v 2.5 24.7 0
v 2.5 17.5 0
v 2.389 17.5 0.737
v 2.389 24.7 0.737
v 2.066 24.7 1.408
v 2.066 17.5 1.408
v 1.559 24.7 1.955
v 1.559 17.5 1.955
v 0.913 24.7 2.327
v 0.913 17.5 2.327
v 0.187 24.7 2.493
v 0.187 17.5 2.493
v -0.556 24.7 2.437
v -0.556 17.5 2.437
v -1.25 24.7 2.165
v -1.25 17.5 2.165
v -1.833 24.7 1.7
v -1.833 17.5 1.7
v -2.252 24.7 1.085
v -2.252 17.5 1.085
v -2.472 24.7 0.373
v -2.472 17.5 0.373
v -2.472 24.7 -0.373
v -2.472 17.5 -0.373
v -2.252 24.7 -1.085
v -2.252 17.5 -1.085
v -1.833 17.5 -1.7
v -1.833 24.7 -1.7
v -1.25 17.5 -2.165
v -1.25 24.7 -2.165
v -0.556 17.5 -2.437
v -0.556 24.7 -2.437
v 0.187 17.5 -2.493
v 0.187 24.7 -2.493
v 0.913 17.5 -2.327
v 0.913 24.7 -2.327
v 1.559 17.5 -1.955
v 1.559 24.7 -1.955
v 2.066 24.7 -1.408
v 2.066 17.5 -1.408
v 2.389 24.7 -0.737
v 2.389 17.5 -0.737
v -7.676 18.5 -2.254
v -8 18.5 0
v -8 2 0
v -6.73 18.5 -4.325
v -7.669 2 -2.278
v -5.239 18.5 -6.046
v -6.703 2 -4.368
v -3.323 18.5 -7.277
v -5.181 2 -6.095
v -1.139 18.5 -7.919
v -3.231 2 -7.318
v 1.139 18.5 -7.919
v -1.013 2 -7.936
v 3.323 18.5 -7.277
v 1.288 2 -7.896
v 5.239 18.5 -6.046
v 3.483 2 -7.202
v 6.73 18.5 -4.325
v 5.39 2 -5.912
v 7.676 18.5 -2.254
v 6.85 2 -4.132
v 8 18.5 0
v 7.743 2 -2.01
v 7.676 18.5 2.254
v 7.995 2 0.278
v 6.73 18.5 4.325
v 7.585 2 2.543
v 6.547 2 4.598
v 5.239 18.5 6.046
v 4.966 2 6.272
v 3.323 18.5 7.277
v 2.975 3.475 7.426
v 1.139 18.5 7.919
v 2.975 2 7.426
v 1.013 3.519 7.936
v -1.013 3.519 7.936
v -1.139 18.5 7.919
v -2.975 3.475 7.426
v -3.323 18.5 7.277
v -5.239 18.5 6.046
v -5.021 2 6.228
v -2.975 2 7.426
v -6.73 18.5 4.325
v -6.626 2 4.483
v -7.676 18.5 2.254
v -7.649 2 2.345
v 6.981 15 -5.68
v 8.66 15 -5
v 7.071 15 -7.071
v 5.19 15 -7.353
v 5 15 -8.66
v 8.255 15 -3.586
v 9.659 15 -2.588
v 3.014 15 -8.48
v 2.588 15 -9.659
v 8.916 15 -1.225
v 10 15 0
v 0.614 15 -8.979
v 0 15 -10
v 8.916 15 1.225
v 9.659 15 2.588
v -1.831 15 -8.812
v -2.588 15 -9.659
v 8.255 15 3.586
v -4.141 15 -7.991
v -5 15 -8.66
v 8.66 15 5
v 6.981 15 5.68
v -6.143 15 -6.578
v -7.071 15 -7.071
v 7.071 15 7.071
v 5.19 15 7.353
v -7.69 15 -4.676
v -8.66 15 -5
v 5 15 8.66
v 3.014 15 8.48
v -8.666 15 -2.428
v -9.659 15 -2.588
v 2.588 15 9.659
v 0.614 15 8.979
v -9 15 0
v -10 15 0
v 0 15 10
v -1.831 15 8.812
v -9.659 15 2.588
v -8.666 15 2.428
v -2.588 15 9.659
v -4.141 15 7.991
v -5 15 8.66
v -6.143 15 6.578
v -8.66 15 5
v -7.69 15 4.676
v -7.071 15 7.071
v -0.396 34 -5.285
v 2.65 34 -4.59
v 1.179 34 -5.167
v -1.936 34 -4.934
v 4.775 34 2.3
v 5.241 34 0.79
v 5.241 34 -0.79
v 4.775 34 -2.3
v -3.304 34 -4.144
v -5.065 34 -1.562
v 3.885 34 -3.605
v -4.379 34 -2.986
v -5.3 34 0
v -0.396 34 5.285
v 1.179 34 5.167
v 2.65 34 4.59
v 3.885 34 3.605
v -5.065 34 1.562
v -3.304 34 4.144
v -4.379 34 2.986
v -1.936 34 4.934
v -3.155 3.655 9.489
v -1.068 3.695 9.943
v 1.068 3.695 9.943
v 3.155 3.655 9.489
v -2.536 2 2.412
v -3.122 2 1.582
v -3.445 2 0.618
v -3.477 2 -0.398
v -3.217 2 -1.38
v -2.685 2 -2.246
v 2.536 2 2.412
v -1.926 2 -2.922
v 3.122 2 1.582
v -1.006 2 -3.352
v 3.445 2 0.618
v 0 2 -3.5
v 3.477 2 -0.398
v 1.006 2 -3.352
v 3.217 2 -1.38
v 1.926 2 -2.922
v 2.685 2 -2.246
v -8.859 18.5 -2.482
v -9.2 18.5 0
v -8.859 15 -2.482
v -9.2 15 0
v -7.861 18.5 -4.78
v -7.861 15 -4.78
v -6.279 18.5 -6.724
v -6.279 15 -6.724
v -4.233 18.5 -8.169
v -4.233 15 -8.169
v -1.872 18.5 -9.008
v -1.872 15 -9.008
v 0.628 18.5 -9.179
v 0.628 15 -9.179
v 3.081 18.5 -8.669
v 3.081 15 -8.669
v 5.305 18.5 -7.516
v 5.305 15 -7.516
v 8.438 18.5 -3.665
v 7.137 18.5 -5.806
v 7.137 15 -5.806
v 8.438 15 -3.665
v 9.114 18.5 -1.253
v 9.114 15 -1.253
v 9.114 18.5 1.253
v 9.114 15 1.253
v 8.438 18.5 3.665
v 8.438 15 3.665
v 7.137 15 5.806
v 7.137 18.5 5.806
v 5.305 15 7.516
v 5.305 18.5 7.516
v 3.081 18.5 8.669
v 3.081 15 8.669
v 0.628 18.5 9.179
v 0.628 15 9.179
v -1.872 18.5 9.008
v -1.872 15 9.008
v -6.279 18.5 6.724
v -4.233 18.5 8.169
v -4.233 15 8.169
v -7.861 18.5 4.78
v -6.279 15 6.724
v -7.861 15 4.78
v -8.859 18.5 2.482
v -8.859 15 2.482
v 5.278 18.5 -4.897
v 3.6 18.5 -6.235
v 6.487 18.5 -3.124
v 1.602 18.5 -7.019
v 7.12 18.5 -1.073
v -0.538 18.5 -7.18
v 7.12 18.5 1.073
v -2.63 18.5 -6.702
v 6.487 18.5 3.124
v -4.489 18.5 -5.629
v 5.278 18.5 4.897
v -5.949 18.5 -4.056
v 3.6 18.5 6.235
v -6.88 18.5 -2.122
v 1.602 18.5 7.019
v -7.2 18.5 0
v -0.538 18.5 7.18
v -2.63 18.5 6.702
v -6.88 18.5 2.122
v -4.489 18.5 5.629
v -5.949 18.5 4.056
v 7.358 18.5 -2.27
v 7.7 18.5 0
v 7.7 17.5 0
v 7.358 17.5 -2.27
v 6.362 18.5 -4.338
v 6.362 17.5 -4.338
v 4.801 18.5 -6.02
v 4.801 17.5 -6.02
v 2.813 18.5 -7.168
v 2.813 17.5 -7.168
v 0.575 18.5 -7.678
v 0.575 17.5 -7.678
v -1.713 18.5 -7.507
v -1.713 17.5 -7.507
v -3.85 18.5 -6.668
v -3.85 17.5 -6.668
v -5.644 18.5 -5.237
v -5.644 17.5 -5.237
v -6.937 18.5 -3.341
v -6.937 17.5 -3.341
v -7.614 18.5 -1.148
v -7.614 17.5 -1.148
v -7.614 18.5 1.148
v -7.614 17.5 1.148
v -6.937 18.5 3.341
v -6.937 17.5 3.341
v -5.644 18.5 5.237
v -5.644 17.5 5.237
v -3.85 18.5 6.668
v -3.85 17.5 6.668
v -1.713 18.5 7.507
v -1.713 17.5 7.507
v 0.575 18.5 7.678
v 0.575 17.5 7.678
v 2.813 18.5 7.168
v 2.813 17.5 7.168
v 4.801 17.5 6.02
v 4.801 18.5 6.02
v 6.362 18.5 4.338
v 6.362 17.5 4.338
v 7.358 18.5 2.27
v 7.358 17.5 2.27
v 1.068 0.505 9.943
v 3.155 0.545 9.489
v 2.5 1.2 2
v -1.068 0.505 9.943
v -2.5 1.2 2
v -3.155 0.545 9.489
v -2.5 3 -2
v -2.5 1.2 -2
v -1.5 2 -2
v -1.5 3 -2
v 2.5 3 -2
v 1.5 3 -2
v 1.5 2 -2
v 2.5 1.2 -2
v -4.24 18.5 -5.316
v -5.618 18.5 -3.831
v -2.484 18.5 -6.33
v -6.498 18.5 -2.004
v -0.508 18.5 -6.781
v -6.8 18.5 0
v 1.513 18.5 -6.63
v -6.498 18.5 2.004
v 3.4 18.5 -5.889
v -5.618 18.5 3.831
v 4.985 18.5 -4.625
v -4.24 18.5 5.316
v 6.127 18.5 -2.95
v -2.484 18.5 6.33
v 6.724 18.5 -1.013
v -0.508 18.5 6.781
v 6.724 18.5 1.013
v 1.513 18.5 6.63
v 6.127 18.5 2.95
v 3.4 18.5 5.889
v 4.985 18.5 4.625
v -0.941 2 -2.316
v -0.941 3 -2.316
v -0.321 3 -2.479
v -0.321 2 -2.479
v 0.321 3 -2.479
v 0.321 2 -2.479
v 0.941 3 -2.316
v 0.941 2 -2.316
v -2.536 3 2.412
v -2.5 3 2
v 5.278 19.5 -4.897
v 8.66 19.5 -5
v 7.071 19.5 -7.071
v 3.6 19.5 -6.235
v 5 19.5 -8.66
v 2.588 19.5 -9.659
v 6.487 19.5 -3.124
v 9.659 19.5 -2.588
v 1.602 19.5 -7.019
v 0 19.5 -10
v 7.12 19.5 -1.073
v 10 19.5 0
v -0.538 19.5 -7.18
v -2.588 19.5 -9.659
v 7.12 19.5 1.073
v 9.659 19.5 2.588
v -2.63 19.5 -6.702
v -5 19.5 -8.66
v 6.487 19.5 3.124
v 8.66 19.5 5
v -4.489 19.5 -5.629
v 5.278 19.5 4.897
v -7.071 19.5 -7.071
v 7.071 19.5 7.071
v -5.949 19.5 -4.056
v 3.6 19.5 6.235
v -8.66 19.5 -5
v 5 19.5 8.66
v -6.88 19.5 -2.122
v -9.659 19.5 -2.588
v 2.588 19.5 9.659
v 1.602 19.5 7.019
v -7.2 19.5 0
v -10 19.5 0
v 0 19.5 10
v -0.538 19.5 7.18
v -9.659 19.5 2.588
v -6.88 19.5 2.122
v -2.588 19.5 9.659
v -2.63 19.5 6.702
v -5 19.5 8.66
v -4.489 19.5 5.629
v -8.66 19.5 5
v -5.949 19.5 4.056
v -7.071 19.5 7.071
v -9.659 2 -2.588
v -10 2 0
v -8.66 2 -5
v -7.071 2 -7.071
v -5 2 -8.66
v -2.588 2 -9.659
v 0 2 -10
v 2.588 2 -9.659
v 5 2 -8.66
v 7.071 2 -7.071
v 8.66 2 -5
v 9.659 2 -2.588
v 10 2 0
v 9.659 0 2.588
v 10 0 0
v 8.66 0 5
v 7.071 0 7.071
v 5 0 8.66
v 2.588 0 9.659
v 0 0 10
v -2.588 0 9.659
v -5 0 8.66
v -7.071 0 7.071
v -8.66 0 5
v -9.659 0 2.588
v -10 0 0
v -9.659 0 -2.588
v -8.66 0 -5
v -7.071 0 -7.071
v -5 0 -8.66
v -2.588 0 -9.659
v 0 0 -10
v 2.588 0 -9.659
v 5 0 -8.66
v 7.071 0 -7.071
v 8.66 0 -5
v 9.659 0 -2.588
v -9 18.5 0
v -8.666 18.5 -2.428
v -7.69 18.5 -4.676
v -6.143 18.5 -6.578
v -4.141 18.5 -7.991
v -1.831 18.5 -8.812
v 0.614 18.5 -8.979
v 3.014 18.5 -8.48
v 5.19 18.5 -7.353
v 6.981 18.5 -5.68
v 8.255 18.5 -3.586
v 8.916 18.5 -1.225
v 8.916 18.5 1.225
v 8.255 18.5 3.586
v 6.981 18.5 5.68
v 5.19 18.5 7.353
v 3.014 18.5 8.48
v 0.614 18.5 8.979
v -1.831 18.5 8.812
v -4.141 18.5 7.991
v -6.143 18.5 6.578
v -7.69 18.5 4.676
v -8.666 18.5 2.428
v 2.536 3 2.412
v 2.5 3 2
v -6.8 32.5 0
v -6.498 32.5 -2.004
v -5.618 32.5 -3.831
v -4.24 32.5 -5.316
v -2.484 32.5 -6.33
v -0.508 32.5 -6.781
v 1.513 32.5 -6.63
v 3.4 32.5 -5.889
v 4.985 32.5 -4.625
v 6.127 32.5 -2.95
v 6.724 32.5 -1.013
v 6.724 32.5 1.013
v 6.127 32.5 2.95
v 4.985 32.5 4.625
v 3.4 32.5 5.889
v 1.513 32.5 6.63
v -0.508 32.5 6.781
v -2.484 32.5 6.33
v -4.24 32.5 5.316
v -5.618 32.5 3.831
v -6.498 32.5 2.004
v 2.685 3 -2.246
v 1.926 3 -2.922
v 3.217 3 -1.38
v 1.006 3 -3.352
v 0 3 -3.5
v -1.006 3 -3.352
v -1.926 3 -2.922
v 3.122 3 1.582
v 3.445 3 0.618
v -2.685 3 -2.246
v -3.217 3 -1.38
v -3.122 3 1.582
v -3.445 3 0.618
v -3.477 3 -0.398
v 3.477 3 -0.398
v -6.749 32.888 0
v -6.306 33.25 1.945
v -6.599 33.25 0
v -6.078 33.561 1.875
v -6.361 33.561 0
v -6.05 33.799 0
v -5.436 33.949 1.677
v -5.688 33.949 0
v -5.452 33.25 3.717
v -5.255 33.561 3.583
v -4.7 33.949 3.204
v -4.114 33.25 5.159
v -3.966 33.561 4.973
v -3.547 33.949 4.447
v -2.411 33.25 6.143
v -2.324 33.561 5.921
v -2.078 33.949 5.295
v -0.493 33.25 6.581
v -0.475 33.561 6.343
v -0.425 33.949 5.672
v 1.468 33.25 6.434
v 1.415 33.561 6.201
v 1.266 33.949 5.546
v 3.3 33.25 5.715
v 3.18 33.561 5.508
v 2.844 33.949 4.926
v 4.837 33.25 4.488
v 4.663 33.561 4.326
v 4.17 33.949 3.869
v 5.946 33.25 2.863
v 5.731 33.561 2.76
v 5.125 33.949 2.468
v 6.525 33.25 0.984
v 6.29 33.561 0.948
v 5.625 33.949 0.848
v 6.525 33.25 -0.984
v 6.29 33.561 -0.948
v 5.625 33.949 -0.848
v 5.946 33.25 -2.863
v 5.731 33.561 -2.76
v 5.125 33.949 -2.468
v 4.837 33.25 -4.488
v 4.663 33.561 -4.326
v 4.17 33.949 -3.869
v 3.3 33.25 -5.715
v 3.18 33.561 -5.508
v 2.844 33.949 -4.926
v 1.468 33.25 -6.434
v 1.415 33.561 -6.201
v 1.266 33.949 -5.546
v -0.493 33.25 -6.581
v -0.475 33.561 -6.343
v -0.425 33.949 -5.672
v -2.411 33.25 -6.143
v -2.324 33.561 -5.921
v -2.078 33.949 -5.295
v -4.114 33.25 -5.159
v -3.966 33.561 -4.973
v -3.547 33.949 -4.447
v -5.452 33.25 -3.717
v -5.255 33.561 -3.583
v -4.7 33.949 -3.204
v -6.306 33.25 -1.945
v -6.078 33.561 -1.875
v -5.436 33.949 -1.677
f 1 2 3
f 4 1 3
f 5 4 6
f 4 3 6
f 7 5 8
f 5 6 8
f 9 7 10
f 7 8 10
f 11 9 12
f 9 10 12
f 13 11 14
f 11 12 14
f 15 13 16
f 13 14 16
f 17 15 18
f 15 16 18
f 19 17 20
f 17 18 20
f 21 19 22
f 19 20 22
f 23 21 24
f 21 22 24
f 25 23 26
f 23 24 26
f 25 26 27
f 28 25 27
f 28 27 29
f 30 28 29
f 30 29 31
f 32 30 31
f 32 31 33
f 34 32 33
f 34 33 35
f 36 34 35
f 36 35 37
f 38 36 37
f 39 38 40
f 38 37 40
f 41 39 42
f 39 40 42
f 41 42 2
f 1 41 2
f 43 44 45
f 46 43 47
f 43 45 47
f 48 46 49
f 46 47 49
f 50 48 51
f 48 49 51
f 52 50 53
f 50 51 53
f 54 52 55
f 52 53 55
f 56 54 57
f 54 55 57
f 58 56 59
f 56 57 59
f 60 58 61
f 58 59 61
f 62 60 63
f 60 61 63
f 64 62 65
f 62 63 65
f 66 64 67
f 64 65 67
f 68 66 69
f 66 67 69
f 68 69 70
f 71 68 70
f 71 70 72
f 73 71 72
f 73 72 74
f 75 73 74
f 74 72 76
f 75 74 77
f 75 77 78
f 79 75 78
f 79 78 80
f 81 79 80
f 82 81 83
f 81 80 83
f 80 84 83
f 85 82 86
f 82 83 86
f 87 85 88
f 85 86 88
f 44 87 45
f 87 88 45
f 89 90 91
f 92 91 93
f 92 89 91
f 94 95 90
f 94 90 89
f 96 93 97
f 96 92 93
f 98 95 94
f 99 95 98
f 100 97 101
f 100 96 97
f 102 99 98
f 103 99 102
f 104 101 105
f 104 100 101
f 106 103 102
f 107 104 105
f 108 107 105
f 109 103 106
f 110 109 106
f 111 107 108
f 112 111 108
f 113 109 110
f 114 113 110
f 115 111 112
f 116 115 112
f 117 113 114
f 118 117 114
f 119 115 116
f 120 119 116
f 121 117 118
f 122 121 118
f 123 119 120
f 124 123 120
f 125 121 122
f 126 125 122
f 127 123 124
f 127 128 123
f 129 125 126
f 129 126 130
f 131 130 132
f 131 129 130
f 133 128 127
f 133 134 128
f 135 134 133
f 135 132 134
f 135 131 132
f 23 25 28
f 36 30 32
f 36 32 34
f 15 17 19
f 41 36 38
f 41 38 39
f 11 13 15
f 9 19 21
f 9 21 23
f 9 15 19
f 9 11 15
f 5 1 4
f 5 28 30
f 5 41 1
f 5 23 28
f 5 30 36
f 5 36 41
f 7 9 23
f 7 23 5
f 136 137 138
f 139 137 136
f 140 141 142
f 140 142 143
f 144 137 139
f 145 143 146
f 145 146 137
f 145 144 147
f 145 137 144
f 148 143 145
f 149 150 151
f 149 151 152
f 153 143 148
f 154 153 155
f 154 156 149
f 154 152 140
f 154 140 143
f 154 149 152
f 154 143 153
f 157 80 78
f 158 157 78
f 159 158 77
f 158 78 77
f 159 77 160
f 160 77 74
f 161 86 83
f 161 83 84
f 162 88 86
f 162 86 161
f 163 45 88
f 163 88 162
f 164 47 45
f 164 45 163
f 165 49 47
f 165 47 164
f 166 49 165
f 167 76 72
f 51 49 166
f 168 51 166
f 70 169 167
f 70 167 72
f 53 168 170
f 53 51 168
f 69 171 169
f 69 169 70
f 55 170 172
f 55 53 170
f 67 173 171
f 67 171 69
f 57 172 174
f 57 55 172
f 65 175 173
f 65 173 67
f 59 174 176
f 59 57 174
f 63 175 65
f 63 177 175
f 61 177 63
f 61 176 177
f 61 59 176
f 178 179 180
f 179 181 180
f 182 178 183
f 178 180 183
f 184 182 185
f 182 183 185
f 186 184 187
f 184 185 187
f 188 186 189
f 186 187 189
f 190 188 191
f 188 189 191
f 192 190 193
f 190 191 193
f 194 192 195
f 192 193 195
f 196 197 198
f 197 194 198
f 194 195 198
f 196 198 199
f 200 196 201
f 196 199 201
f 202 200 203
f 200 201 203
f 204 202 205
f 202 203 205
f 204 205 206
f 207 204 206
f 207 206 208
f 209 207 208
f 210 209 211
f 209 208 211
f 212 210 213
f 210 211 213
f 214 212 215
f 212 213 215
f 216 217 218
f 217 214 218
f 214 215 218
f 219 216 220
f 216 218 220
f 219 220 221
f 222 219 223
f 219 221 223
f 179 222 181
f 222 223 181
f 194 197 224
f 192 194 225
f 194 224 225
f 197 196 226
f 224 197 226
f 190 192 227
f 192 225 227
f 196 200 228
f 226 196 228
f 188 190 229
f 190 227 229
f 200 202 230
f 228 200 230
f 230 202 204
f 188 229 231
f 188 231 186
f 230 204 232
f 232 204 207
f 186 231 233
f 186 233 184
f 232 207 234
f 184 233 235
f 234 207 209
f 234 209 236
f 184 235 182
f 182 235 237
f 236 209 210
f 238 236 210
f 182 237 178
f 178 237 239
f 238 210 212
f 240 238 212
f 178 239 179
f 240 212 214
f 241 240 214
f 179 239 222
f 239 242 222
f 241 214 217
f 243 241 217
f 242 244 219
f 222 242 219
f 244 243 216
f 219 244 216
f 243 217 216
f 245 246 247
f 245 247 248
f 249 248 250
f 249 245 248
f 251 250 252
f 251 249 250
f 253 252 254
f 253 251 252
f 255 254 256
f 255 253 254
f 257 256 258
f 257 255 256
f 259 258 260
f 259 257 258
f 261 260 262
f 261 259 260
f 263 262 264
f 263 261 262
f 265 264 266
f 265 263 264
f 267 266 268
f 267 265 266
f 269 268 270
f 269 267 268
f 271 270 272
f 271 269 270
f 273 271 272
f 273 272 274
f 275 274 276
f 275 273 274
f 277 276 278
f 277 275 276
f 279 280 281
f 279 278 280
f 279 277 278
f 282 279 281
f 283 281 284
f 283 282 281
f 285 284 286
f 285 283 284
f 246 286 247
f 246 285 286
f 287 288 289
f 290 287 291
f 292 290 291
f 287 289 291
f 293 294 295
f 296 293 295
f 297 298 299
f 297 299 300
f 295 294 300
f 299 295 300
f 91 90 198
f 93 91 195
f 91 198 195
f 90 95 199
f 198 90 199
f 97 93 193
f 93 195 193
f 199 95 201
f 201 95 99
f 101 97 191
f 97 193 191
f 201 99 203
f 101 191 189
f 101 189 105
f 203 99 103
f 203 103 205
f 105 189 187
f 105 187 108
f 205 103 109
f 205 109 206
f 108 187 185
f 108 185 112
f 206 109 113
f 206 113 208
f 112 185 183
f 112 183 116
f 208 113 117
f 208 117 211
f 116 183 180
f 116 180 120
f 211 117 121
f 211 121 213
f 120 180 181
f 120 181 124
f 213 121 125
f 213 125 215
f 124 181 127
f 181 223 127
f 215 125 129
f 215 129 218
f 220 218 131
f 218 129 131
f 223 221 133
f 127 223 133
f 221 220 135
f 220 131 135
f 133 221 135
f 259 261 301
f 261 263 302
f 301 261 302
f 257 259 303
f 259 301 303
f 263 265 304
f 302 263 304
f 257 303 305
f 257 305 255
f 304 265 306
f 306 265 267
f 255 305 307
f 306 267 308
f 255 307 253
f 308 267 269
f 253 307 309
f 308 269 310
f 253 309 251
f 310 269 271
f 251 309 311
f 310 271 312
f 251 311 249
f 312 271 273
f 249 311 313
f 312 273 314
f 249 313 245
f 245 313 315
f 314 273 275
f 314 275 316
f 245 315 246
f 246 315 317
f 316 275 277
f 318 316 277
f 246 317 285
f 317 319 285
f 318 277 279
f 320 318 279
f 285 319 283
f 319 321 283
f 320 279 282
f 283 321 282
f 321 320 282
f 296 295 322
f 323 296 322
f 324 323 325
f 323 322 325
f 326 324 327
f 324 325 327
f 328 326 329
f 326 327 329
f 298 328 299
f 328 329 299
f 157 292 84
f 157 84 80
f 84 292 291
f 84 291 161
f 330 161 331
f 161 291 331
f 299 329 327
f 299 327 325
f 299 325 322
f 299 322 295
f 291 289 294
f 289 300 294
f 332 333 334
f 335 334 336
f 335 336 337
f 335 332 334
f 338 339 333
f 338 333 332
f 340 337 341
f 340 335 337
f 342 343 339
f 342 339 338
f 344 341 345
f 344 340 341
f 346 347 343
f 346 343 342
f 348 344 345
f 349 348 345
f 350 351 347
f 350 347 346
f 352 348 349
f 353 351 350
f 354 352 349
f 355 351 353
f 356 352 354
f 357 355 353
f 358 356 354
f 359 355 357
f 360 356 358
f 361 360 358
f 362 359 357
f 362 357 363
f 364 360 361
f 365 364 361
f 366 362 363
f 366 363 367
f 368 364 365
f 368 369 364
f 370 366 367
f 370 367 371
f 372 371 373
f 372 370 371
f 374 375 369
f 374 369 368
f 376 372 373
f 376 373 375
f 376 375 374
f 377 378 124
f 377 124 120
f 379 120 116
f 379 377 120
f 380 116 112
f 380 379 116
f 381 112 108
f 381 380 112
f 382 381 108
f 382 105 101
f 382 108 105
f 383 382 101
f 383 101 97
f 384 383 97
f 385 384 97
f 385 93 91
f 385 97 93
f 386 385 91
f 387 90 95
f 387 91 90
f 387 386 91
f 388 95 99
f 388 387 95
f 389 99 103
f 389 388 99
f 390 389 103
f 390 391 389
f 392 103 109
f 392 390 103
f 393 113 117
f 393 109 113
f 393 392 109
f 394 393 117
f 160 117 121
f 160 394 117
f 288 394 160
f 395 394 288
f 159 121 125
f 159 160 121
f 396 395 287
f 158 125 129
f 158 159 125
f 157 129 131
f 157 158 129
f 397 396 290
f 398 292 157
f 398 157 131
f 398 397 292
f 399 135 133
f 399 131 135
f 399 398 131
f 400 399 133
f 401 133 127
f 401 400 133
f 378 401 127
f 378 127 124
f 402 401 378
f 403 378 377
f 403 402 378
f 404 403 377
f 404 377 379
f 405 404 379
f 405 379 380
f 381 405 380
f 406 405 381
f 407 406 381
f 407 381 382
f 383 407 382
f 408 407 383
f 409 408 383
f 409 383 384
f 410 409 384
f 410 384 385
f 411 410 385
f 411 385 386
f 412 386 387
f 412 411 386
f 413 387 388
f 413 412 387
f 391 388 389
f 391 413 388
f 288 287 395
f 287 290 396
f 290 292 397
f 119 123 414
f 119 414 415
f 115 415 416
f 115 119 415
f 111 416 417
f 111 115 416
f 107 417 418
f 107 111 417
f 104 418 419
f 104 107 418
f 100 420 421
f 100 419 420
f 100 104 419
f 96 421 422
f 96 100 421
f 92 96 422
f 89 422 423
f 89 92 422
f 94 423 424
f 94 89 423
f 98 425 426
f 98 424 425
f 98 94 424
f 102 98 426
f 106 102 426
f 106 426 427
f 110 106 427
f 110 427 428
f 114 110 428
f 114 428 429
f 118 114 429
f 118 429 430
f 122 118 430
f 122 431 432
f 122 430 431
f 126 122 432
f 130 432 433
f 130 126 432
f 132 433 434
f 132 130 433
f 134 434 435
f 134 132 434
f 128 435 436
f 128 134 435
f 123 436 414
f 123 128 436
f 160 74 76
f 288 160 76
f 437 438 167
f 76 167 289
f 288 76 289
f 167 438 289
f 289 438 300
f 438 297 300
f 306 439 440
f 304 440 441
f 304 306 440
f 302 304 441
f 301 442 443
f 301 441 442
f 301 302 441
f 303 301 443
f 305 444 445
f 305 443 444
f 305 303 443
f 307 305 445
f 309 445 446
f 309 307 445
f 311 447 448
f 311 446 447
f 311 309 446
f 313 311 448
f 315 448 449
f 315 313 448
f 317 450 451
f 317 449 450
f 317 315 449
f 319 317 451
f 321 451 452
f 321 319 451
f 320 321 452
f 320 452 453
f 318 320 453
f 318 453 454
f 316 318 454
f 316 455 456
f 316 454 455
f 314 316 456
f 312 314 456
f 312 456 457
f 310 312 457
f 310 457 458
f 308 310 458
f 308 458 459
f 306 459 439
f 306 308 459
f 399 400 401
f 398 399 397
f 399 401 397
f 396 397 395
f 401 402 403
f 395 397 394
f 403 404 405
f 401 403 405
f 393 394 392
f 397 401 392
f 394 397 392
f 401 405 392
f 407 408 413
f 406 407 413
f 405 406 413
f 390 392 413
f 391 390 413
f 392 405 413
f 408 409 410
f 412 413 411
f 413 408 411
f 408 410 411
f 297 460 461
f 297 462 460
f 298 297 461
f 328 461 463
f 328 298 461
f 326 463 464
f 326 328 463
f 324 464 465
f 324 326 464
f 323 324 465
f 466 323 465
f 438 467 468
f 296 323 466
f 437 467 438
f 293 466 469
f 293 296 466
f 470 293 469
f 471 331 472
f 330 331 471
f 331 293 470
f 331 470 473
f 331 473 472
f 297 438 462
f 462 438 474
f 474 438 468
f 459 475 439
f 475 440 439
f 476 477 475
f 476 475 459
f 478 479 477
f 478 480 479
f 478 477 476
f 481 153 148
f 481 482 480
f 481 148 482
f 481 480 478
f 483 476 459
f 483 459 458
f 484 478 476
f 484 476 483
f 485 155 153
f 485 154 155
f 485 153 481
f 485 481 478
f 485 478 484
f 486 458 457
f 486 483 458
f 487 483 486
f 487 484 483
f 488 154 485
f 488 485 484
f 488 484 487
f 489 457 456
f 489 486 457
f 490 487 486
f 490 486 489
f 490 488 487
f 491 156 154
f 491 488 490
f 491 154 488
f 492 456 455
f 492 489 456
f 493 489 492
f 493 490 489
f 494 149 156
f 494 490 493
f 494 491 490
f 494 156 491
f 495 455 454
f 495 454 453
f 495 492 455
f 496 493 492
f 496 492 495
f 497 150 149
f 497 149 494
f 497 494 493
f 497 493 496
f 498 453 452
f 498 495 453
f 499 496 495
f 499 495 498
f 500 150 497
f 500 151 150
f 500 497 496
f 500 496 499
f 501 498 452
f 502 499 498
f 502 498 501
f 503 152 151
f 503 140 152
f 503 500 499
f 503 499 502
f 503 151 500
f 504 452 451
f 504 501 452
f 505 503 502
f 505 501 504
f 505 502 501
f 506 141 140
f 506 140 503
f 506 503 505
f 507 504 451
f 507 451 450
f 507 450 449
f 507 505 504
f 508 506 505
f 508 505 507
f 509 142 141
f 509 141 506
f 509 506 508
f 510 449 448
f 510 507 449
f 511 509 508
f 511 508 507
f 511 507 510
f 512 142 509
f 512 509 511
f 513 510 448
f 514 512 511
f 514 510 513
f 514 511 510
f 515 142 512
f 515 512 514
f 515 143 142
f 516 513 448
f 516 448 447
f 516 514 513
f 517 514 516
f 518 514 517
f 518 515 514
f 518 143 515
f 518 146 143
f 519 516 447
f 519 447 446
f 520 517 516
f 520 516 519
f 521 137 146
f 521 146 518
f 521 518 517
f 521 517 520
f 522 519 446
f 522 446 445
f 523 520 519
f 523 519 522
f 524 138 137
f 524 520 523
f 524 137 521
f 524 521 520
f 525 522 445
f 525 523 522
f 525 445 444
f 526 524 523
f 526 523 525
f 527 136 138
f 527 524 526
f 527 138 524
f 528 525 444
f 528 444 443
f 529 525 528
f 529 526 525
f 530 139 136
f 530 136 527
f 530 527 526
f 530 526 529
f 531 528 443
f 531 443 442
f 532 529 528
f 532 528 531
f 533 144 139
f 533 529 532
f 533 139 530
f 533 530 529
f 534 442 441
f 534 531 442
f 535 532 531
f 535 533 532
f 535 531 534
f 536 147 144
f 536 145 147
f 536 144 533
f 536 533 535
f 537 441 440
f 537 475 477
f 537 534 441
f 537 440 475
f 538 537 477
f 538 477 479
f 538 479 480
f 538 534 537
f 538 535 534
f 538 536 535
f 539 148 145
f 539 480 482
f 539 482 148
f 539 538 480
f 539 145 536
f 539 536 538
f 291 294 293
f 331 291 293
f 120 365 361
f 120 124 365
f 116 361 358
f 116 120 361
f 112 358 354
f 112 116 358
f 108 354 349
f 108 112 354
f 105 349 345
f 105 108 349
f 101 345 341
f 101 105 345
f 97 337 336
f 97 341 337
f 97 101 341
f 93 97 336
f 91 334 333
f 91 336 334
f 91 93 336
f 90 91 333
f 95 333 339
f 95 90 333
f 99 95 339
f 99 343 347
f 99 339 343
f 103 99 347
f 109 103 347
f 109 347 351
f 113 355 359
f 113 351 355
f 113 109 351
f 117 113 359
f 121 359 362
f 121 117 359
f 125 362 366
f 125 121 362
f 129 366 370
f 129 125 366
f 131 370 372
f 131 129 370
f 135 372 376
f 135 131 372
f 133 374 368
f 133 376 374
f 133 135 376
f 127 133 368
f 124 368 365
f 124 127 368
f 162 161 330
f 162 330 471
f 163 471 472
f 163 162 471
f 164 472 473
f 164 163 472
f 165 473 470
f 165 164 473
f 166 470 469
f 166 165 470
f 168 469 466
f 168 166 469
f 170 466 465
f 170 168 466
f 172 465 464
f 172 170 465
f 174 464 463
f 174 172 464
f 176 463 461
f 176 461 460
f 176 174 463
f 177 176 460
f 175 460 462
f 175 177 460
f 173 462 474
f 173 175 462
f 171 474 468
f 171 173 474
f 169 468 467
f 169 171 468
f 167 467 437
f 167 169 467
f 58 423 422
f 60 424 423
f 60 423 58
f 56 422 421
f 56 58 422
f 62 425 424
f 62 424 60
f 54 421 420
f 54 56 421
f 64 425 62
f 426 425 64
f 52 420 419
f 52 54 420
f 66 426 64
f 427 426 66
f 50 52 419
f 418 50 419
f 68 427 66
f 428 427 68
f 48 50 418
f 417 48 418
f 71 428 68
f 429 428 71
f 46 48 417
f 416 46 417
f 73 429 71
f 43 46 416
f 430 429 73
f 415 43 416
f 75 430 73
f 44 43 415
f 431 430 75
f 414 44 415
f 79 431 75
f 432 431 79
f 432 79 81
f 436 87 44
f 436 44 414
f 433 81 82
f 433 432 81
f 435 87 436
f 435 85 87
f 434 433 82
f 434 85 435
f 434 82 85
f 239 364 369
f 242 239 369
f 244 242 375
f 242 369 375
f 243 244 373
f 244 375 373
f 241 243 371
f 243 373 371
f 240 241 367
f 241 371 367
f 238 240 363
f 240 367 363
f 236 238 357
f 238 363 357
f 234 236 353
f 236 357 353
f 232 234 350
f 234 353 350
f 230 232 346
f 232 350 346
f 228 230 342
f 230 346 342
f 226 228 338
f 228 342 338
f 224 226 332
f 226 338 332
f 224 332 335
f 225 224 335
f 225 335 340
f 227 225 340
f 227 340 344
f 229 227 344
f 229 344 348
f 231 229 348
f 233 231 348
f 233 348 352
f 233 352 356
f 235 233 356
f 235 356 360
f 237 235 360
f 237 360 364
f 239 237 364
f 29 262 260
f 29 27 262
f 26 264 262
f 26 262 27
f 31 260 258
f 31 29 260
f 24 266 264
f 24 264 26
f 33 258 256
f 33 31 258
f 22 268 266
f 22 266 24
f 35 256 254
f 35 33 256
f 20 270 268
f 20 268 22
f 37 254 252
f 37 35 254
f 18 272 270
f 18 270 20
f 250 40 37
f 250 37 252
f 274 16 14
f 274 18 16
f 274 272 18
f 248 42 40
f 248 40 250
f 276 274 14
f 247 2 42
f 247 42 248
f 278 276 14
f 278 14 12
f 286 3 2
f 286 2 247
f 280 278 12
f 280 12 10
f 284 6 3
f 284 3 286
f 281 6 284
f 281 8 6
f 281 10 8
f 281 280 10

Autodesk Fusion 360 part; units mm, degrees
sketch "Sketch1" plane through (0, 0, 0) normal (0, 1, 0) x (1, 0, 0) in component "Base"
  circle A0 centre (0, 0) radius 10
  dimension "d63" = 20
extrude "Extrude1" add sketch "Sketch1" along normal blind 2 makes body 1 in component "Base"
sketch "Sketch2" plane through (0, 2, 0) normal (0, 1, 0) x (-1, 0, 0) in component "Base"
  circle A0 centre (0, 0) radius 10
  circle A1 centre (0, 0) radius 8
  dimension "d66" = -2
extrude "Extrude2" add sketch "Sketch2" along normal blind 13 bodies 1 in component "Base"
sketch "Sketch3" plane through (0, 15, 0) normal (0, 1, 0) x (-1, 0, 0) in component "Base"
  circle A0 centre (0, 0) radius 8
  circle A1 centre (0, 0) radius 10
  circle A2 centre (0, 0) radius 9
  dimension "d69" = 1
extrude "Extrude3" add sketch "Sketch3" along normal blind 3.5 contours A2 bodies 1 in component "Base"
sketch "Sketch2 (2)" plane through (0, 15, 0) normal (0, 1, 0) x (-1, 0, 0) in component "Ring"
  circle A0 centre (0, 0) radius 9 construction
  circle A1 centre (0, 0) radius 10
  circle A2 centre (0, 0) radius 9.2
  dimension "offset_bottom" = 0.2
extrude "Extrude1'" add sketch "Sketch2 (2)" along normal blind 3.5 separate body makes body 2 in component "Ring"
sketch "Sketch3 (2)" plane through (0, 18.5, 0) normal (0, 1, 0) x (-1, 0, 0) in component "Ring"
  circle A0 centre (0, 0) radius 9.2 construction
  circle A1 centre (0, 0) radius 10
extrude "Extrude2'" add sketch "Sketch3 (2)" along normal blind 1 bodies 2 in component "Ring"
sketch "Sketch4" plane through (0, 19.5, 0) normal (0, 1, 0) x (-1, 0, 0) in component "Ring"
  circle A0 centre (0, 0) radius 10
  circle A1 centre (0, 0) radius 9
  circle A2 centre (0, 0) radius 7.2
  dimension "d77" = 18
  dimension "diameter_apperture" = 14.4
extrude "Extrude3'" cut sketch "Sketch4" against normal blind 1 contours A2 bodies 2 in component "Ring"
sketch "Sketch1 (2)" plane through (0, 18.5, 0) normal (0, -1, 0) x (1, 0, 0) in component "Top"
  circle A0 centre (0, 0) radius 7.2 construction
  circle A1 centre (0, 0) radius 9.2 construction
  circle A2 centre (0, 0) radius 7.7
  dimension "diameter_bottom_disc" = 15.4
extrude "Extrude1''" add sketch "Sketch1 (2)" along normal blind 1 separate body makes body 3 in component "Top"
ref_plane "WorkPlane2" through (0, 17.1186, 0) normal (0, 0, 1) x (-1, 0, 0)
sketch "Sketch2 (3)" plane through (0, 18.5, 0) normal (0, 1, 0) x (-1, 0, 0) in component "Top"
  circle A0 centre (0, 0) radius 7.7
  circle A1 centre (0, 0) radius 6.8
  dimension "diameter_tower" = 13.6
extrude "Extrude2''" add sketch "Sketch2 (3)" along normal blind 15.5 contours A1 bodies 3 in component "Top"
sketch "Sketch3 (3)" plane through (0, 17.5, 0) normal (0, -1, 0) x (1, 0, 0) in component "Top"
  circle A0 centre (0, 0) radius 7.7
  circle A1 centre (0, 0) radius 2.5
  dimension "d90" = 5
extrude "Extrude3''" cut sketch "Sketch3 (3)" against normal blind 7.2 contours A1 bodies 3 in component "Top"
sketch "Sketch4 (2)" plane through (0, 2, 0) normal (0, 1, 0) x (-1, 0, 0) in component "Base"
  circle A0 centre (0, 0) radius 8
  circle A1 centre (0, 0) radius 2.5
  circle A2 centre (0, 0) radius 3.5
  dimension "d98" = 5
  dimension "d99" = 1
extrude "Extrude4" add sketch "Sketch4 (2)" along normal blind 1 contours A2 bodies 1 in component "Base"
ref_plane "WorkPlane1" through (0, 2.8235, -3.5) normal (0, 0, -1) x (1, 0, 0) in component "Base"
ref_plane "WorkPlane2" through (0, 2.5, 3.5) normal (0, 0, 1) x (1, 0, 0) in component "Base"
ref_plane "WorkPlane3" through (0, 2.8235, 0) normal (0, 0, -1) x (1, 0, 0) in component "Base"
sketch "Sketch6" plane through (0, 2.8235, 0) normal (0, 0, -1) x (1, 0, 0) in component "Base"
  line L0 (-3.5, -0.1765) -> (3.5, -0.1765)
  line L1 (-10, 2.8235) -> (10, 2.8235)
  line L2 (3.5, 0.8235) -> (-3.5, 0.8235) construction
  line L3 (-3.5, -0.1765) -> (-3.5, 0.8235) construction
  line L4 (3.5, -0.1765) -> (3.5, 0.8235) construction
  line L5 (-3.5, -0.1765) -> (-2.5, -0.1765) construction
  line L6 (-2.5, -0.1765) -> (-2.5, 0.8235) construction
  line L7 (-2.5, 0.8235) -> (-3.5, 0.8235) construction
  line L8 (-3.5, 0.8235) -> (-3.5, -0.1765) construction
  line L9 (3.5, -0.1765) -> (2.5, -0.1765) construction
  line L10 (2.5, -0.1765) -> (2.5, 0.8235) construction
  line L11 (2.5, 0.8235) -> (3.5, 0.8235) construction
  line L12 (3.5, 0.8235) -> (3.5, -0.1765) construction
  line L13 (-2.5, -0.1765) -> (2.5, -0.1765)
  line L14 (2.5, -0.1765) -> (2.5, 1.6235)
  line L15 (2.5, 1.6235) -> (-2.5, 1.6235)
  line L16 (-2.5, 1.6235) -> (-2.5, -0.1765)
  dimension "d104" = 1
  dimension "d105" = 1
  dimension "d106" = 1
  dimension "d107" = 1
  dimension "d108" = 1.8
extrude "Extrude5" cut sketch "Sketch6" along normal blind 2 bodies 1 in component "Base"
extrude "Extrude6" cut sketch "Sketch6" against normal through all bodies 1 in component "Base"
ref_plane "WorkPlane4" through (0, 2.8235, 2) normal (0, 0, -1) x (1, 0, 0) in component "Base"
sketch "Sketch7" plane through (0, 2.8235, 2) normal (0, 0, -1) x (1, 0, 0) in component "Base"
  line L0 (2.5, -0.1765) -> (2.5, 1.6235)
  line L1 (-2.5, -0.1765) -> (2.5, -0.1765)
  line L2 (2.5, 1.6235) -> (-2.5, 1.6235)
  line L3 (-2.5, 1.6235) -> (-2.5, -0.1765)
extrude "Extrude7" cut sketch "Sketch7" against normal through all draft 5 bodies 1 in component "Base"
fillet "Fillet1" radius 1.5 1 edges at (6.3398, 34, -2.459) on bodies 3 in component "Top"
component "Base" placed x (1, 0, 0) y (0, 1, 0) z (0, 0, 1) at (0, 0, 0)
component "Ring" placed x (1, 0, 0) y (0, 1, 0) z (0, 0, 1) at (0, 0, 0)
component "Top" placed x (1, 0, 0) y (0, 1, 0) z (0, 0, 1) at (0, 0, 0)
equation "base_diameter = 20 mm"
equation "tolerance = 0.2 mm"
equation "wall_thickness = 1 mm"
equation "base_total_height = 18.5 mm"
equation "base_ring_height = 3.5 mm"
equation "base_bottom_thickness = 2 mm"
equation "d63 = base_diameter"
equation "d64 = base_bottom_thickness"
equation "d66 = -2 * wall_thickness"
equation "d67 = base_total_height - base_bottom_thickness - base_ring_height"
equation "d69 = wall_thickness"
equation "d70 = base_ring_height"
equation "offset_bottom = tolerance"
equation "d73 = base_ring_height"
equation "d75 = wall_thickness"
equation "d77 = base_diameter - 2 * wall_thickness"
equation "diameter_apperture = base_diameter - 6 * wall_thickness + 2 * tolerance"
equation "d79 = -wall_thickness"
equation "diameter_bottom_disc = base_diameter - 4 * wall_thickness - 3 * tolerance"
equation "d83 = wall_thickness"
equation "diameter_tower = base_diameter - 6 * wall_thickness - 2 * tolerance"
equation "top_safety_margin = 1 mm" comment "To avoid the top to get stuck inside base"
equation "d88 = base_total_height - 2 * wall_thickness - base_bottom_thickness + top_safety_margin"
equation "d90 = magnet_diameter"
equation "magnet_diameter = 5 mm"
equation "magnet_height = 2.4 mm"
equation "magnet_quantity = 3"
equation "d95 = -magnet_height * magnet_quantity"
equation "spring_diameter = 5 mm"
equation "d98 = spring_diameter"
equation "d99 = wall_thickness"
equation "d100 = wall_thickness"
equation "d104 = wall_thickness"
equation "d105 = wall_thickness"
equation "d106 = wall_thickness"
equation "d107 = wall_thickness"
